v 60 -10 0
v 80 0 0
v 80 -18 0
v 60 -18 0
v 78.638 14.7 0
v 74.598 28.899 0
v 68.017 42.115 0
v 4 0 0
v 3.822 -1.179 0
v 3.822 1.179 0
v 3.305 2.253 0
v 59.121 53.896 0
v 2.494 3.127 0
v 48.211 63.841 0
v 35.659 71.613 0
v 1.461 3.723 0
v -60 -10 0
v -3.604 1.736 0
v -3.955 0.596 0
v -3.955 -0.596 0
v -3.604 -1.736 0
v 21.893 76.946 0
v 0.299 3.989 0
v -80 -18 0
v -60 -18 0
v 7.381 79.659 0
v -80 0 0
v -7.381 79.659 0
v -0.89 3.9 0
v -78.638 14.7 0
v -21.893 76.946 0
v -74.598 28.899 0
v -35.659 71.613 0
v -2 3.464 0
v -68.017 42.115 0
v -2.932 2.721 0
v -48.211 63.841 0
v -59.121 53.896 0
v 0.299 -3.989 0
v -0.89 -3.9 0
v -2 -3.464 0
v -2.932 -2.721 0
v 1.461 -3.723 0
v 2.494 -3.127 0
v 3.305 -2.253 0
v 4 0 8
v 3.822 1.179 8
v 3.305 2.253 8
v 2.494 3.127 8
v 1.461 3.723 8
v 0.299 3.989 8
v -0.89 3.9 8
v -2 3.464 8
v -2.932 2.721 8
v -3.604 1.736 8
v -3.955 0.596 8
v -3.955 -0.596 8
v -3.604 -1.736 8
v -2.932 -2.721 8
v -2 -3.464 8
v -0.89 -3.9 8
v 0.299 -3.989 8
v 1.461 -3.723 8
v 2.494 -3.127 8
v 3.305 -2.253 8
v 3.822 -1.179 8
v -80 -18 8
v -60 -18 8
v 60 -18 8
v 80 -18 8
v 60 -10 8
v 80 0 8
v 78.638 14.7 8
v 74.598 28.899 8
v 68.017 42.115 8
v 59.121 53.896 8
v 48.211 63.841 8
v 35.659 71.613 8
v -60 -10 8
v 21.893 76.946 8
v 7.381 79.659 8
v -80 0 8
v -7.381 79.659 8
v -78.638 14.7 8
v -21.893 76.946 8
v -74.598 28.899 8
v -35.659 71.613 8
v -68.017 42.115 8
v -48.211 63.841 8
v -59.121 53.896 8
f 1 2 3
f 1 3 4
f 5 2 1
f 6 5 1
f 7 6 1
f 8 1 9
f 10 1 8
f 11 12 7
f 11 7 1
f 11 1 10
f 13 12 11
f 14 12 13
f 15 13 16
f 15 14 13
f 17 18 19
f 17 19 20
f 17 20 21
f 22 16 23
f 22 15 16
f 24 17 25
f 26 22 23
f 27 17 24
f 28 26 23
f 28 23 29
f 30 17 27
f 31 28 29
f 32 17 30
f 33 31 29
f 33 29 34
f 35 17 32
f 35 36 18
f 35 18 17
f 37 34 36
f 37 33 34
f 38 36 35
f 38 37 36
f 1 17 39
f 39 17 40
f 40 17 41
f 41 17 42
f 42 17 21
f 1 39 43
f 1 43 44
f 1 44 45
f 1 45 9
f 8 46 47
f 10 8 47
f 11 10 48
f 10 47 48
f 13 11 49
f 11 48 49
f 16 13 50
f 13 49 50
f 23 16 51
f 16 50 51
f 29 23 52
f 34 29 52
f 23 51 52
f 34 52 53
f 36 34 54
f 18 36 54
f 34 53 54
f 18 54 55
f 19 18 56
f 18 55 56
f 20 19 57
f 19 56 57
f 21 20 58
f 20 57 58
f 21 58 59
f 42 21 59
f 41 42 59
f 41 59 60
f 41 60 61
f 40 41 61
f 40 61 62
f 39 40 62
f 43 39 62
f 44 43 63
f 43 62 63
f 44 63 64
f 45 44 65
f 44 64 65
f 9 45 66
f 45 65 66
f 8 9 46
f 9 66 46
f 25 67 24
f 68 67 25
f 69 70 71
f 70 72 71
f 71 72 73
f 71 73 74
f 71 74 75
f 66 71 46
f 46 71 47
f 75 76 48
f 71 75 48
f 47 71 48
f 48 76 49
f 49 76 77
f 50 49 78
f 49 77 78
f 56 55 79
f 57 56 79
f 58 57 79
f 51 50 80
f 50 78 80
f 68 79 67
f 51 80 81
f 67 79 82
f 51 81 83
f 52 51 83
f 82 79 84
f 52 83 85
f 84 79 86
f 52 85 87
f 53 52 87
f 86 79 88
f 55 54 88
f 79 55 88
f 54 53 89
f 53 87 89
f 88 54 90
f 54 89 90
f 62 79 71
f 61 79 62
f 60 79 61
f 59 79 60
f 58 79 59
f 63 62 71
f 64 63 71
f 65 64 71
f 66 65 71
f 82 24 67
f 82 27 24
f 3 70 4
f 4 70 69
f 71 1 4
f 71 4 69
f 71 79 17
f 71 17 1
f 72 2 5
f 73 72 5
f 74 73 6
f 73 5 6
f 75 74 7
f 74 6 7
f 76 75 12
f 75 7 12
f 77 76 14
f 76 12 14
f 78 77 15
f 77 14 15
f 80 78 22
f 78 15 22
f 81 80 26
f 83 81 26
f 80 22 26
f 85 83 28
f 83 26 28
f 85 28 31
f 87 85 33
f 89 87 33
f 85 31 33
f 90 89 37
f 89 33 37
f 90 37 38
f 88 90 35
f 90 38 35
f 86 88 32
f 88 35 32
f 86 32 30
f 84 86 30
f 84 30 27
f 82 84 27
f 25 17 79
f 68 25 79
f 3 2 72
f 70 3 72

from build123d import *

# Parameters (mm, degrees)
BOSS_EXTRUDE1_DEPTH = 8
SKETCH5_W           = 160
SKETCH5_H           = 8
BOSS_EXTRUDE4_DEPTH = 10
SKETCH6_W           = 20
SKETCH6_H           = 8
BOSS_EXTRUDE5_DEPTH = 8
SKETCH7_R           = 4
CUT_EXTRUDE2_DEPTH  = 8


with BuildPart() as part:
    # Sketch1 → Boss-Extrude1 (new body)
    with BuildSketch(Plane.XY):
        with BuildLine():
            Line((-80, 0), (80, 0))
            ThreePointArc((80, 0), (0, 80), (-80, 0))
        make_face()
    extrude(amount=BOSS_EXTRUDE1_DEPTH)

    # Sketch5 → Boss-Extrude4 (add)
    with BuildSketch(Plane.XZ):
        with Locations((0, 4)):
            Rectangle(SKETCH5_W, SKETCH5_H)
    extrude(amount=BOSS_EXTRUDE4_DEPTH)

    # Sketch6 → Boss-Extrude5 (add)
    with BuildSketch(Plane.XZ.offset(10)):
        with Locations((-70, 4)):
            Rectangle(SKETCH6_W, SKETCH6_H)
    boss_extrude5 = extrude(amount=BOSS_EXTRUDE5_DEPTH)

    # Mirror2: Boss-Extrude5 across plane
    add(boss_extrude5.mirror(Plane(origin=(0, 0, 0), x_dir=(0, 0, 1), z_dir=(1, 0, 0))))

    # Sketch7 → Cut-Extrude2 (cut)
    with BuildSketch(Plane.XY.offset(8)):
        Circle(SKETCH7_R)
    extrude(amount=-CUT_EXTRUDE2_DEPTH, mode=Mode.SUBTRACT)


solid = part.part
